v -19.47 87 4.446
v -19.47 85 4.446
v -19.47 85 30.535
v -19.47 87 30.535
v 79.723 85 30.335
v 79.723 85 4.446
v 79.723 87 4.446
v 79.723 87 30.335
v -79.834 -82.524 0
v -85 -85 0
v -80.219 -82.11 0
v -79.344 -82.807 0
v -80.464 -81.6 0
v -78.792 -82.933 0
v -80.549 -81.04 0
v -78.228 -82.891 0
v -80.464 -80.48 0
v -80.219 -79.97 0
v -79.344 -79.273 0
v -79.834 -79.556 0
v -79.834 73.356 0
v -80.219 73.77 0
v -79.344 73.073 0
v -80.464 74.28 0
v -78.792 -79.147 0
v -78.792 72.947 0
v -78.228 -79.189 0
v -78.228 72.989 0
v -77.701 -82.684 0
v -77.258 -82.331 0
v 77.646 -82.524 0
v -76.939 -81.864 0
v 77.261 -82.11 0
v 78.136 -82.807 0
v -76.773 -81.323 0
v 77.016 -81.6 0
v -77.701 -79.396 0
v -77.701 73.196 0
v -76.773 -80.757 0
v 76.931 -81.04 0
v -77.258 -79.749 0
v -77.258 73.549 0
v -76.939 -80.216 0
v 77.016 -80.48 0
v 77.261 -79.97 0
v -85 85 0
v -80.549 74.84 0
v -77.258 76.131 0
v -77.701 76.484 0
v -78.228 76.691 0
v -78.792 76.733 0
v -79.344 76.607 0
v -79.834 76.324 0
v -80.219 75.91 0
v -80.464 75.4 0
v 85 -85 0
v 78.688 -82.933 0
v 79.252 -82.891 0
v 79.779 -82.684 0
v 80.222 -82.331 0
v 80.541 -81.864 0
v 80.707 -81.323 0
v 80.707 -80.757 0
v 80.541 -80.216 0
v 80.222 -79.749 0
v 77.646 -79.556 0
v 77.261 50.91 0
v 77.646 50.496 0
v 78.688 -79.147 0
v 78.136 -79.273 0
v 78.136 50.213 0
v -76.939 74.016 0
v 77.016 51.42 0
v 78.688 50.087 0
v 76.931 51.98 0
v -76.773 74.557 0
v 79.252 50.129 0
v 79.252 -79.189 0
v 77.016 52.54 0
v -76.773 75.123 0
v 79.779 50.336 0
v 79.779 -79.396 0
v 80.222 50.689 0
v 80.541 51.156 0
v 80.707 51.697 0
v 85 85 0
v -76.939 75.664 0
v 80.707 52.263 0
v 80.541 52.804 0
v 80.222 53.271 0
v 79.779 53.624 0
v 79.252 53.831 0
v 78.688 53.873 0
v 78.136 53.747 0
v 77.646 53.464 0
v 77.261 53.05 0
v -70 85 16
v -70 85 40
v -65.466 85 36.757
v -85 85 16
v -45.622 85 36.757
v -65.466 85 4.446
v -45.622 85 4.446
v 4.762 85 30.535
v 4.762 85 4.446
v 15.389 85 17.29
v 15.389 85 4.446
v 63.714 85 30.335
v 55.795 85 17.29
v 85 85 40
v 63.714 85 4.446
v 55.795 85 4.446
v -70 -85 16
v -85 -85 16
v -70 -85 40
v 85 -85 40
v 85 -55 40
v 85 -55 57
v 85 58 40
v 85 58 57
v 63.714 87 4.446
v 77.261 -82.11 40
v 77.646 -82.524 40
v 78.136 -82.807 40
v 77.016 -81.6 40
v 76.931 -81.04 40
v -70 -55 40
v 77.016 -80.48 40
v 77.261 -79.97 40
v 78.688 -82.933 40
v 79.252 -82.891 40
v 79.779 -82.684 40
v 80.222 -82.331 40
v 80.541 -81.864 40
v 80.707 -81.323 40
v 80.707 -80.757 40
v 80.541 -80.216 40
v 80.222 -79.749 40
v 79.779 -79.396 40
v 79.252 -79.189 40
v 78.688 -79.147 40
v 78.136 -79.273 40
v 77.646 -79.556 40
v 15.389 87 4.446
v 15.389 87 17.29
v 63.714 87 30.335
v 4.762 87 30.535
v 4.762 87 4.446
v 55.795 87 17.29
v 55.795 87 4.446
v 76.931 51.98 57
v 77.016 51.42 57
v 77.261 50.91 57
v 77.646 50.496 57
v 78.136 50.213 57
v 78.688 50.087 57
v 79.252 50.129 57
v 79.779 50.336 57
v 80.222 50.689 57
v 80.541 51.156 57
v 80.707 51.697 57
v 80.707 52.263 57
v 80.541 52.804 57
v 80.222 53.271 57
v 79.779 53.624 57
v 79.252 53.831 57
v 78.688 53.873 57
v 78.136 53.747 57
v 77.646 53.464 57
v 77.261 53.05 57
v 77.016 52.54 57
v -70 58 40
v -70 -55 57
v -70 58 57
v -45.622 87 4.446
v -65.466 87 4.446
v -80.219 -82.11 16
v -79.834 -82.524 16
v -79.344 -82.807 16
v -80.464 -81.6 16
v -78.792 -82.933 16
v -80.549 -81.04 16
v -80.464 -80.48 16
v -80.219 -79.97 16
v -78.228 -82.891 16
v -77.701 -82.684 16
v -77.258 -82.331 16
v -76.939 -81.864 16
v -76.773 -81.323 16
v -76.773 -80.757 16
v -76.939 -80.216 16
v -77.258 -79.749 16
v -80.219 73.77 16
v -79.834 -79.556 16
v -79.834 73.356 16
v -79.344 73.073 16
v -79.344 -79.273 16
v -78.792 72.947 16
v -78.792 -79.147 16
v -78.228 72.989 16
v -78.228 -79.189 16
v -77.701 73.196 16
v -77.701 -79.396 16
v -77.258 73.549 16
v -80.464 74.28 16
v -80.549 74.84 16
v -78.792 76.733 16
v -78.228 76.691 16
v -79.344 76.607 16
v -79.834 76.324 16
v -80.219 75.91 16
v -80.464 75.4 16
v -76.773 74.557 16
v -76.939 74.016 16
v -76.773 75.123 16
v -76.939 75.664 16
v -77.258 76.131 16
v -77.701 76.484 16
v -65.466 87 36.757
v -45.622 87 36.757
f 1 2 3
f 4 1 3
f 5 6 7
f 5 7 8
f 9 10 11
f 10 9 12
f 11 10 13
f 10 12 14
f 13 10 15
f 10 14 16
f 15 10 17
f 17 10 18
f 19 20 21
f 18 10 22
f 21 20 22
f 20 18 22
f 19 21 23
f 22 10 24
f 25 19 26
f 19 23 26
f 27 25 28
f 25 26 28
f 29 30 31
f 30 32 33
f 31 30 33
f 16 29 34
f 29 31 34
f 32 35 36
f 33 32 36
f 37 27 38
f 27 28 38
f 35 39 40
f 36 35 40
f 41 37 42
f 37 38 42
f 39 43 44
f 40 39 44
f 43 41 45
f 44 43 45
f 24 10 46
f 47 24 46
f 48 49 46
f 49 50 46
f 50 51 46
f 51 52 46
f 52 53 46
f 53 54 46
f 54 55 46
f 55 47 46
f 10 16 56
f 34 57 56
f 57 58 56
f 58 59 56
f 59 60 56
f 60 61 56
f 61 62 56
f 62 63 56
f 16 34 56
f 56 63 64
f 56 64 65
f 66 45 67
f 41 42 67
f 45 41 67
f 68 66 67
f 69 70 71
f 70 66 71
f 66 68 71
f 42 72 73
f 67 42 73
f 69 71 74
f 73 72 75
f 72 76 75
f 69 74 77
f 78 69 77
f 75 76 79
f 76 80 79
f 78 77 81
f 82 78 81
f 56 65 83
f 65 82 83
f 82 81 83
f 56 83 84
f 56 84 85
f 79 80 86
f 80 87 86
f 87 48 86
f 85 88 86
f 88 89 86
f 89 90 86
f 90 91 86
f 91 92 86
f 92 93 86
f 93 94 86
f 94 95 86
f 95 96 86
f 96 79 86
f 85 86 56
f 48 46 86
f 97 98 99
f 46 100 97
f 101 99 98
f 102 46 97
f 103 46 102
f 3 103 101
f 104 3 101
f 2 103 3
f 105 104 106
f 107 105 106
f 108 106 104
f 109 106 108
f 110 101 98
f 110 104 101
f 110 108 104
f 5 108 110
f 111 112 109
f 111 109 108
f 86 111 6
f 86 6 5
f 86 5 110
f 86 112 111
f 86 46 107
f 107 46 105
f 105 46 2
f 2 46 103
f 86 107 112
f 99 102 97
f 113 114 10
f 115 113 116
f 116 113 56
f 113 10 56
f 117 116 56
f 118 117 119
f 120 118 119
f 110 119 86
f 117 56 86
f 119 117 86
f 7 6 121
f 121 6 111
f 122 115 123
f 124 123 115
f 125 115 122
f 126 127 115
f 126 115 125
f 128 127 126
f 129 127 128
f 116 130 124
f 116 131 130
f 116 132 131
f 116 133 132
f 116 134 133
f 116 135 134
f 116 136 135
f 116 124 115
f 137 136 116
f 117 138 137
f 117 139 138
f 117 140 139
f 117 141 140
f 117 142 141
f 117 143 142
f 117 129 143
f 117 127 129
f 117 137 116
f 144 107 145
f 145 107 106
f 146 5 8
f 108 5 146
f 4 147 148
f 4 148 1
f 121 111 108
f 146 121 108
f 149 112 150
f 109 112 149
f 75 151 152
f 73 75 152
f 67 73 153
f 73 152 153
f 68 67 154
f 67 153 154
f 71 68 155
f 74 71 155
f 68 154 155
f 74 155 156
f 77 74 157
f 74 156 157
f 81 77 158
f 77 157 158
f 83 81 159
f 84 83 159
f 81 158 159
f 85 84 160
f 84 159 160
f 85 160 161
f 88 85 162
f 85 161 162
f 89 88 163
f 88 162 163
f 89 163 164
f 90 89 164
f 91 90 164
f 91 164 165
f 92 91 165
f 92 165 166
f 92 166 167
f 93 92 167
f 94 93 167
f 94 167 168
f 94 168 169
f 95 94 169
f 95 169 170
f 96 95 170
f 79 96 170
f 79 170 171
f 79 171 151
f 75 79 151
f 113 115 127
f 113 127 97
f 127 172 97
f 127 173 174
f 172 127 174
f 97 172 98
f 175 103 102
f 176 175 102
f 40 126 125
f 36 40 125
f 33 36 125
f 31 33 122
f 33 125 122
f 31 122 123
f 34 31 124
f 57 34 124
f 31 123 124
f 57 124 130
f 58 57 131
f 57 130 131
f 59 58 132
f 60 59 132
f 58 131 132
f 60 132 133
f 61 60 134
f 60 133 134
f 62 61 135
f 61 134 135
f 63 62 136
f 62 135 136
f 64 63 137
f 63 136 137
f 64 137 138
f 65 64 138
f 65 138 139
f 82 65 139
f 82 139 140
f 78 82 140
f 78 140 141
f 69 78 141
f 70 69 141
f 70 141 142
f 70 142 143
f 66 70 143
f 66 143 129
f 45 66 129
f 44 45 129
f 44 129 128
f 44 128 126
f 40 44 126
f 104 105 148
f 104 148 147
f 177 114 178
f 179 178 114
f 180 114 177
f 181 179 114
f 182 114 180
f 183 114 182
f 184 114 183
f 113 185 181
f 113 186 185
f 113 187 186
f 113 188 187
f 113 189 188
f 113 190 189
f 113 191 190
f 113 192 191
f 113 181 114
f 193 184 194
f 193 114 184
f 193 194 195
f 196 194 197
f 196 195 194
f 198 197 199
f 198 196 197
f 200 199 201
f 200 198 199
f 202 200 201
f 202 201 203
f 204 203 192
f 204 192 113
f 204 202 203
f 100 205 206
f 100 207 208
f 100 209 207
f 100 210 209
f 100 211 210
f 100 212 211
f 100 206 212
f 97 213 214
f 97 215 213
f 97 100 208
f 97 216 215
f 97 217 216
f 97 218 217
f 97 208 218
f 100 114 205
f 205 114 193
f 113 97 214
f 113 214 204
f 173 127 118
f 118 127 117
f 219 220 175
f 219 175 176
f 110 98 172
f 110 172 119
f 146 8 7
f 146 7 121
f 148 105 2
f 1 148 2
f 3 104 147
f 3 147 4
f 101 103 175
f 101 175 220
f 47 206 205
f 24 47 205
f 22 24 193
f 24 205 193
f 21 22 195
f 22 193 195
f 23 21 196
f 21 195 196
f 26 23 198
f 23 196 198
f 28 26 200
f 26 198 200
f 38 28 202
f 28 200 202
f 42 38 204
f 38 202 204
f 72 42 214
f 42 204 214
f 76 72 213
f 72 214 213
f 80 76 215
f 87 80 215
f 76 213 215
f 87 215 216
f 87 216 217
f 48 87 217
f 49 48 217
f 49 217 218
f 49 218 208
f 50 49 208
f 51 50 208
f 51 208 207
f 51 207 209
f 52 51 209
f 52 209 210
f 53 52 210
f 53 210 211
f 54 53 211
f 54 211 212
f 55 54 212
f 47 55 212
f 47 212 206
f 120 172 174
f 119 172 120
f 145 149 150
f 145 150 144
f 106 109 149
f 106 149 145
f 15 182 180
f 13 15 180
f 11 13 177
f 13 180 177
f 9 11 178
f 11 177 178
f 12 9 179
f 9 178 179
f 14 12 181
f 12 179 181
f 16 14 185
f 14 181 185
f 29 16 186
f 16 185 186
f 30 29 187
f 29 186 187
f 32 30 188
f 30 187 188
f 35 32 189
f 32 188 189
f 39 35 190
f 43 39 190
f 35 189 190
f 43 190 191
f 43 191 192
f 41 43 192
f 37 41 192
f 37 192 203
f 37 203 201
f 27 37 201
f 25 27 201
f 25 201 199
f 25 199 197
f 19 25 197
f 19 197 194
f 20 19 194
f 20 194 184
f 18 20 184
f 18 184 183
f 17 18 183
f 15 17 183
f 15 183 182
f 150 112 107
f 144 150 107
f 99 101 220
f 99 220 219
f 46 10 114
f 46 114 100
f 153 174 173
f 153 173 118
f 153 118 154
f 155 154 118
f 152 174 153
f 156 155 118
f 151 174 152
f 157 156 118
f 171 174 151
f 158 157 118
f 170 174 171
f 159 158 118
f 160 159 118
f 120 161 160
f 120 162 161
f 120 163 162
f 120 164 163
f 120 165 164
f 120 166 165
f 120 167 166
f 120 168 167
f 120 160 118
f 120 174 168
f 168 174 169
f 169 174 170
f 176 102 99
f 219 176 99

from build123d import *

# Parameters (mm, degrees)
F0_W     = 170
F0_H     = 170
F1_DEPTH = 40
F2_W     = 155
F2_H     = 113
F3_DEPTH = 17
F4_DEPTH = 24
F6_D     = 3.7973
F7_W     = 16.0088125554
F7_H     = 25.888455566
F7_W_2   = 40.4067277214
F7_H_2   = 12.8438859247
F7_W_3   = 24.2321552965
F7_H_3   = 26.0891397484
F7_W_4   = 19.8441686174
F7_H_4   = 32.3103985284
F8_DEPTH = 2


with BuildPart() as f1:
    # F0 (on Top) → F1 (new body)
    with BuildSketch(Plane.XY):
        Rectangle(F0_W, F0_H)
    extrude(amount=F1_DEPTH)

    # F2 (on face) → F3 (join)
    with BuildSketch(Plane.XY.offset(40)):
        with Locations((7.5, 1.5)):
            Rectangle(F2_W, F2_H)
    extrude(amount=F3_DEPTH)

    # F2 (on face) → F4 (cut)
    with BuildSketch(Plane.XY.offset(40)):
        Polygon((-70, 58), (-70, 85), (-85, 85), (-85, -85), (-70, -85), (-70, -55), align=None)
    extrude(amount=-F4_DEPTH, mode=Mode.SUBTRACT)

    # F6 (through all)
    with Locations(Plane(origin=(0, 0, 0), x_dir=(1, 0, 0), z_dir=(0, 0, -1))):
        with Locations((-78.65, -74.84), (78.83, -51.98), (78.83, 81.04), (-78.65, 81.04)):
            Hole(F6_D / 2)

    # F7 (on face) → F8 (join)
    with BuildSketch(Plane(origin=(0, 85, 0), x_dir=(-1, 0, 0), z_dir=(0, 1, 0))):
        with Locations((-71.7186613039, 17.3905782867)):
            Rectangle(F7_W, F7_H)
        with Locations((-35.5920631724, 10.868293466)):
            Rectangle(F7_W_2, F7_H_2)
        with Locations((7.3542475339, 17.4909203779)):
            Rectangle(F7_W_3, F7_H_3)
        with Locations((55.5439972199, 20.6015497679)):
            Rectangle(F7_W_4, F7_H_4)
    extrude(amount=F8_DEPTH)


solid = f1.part
